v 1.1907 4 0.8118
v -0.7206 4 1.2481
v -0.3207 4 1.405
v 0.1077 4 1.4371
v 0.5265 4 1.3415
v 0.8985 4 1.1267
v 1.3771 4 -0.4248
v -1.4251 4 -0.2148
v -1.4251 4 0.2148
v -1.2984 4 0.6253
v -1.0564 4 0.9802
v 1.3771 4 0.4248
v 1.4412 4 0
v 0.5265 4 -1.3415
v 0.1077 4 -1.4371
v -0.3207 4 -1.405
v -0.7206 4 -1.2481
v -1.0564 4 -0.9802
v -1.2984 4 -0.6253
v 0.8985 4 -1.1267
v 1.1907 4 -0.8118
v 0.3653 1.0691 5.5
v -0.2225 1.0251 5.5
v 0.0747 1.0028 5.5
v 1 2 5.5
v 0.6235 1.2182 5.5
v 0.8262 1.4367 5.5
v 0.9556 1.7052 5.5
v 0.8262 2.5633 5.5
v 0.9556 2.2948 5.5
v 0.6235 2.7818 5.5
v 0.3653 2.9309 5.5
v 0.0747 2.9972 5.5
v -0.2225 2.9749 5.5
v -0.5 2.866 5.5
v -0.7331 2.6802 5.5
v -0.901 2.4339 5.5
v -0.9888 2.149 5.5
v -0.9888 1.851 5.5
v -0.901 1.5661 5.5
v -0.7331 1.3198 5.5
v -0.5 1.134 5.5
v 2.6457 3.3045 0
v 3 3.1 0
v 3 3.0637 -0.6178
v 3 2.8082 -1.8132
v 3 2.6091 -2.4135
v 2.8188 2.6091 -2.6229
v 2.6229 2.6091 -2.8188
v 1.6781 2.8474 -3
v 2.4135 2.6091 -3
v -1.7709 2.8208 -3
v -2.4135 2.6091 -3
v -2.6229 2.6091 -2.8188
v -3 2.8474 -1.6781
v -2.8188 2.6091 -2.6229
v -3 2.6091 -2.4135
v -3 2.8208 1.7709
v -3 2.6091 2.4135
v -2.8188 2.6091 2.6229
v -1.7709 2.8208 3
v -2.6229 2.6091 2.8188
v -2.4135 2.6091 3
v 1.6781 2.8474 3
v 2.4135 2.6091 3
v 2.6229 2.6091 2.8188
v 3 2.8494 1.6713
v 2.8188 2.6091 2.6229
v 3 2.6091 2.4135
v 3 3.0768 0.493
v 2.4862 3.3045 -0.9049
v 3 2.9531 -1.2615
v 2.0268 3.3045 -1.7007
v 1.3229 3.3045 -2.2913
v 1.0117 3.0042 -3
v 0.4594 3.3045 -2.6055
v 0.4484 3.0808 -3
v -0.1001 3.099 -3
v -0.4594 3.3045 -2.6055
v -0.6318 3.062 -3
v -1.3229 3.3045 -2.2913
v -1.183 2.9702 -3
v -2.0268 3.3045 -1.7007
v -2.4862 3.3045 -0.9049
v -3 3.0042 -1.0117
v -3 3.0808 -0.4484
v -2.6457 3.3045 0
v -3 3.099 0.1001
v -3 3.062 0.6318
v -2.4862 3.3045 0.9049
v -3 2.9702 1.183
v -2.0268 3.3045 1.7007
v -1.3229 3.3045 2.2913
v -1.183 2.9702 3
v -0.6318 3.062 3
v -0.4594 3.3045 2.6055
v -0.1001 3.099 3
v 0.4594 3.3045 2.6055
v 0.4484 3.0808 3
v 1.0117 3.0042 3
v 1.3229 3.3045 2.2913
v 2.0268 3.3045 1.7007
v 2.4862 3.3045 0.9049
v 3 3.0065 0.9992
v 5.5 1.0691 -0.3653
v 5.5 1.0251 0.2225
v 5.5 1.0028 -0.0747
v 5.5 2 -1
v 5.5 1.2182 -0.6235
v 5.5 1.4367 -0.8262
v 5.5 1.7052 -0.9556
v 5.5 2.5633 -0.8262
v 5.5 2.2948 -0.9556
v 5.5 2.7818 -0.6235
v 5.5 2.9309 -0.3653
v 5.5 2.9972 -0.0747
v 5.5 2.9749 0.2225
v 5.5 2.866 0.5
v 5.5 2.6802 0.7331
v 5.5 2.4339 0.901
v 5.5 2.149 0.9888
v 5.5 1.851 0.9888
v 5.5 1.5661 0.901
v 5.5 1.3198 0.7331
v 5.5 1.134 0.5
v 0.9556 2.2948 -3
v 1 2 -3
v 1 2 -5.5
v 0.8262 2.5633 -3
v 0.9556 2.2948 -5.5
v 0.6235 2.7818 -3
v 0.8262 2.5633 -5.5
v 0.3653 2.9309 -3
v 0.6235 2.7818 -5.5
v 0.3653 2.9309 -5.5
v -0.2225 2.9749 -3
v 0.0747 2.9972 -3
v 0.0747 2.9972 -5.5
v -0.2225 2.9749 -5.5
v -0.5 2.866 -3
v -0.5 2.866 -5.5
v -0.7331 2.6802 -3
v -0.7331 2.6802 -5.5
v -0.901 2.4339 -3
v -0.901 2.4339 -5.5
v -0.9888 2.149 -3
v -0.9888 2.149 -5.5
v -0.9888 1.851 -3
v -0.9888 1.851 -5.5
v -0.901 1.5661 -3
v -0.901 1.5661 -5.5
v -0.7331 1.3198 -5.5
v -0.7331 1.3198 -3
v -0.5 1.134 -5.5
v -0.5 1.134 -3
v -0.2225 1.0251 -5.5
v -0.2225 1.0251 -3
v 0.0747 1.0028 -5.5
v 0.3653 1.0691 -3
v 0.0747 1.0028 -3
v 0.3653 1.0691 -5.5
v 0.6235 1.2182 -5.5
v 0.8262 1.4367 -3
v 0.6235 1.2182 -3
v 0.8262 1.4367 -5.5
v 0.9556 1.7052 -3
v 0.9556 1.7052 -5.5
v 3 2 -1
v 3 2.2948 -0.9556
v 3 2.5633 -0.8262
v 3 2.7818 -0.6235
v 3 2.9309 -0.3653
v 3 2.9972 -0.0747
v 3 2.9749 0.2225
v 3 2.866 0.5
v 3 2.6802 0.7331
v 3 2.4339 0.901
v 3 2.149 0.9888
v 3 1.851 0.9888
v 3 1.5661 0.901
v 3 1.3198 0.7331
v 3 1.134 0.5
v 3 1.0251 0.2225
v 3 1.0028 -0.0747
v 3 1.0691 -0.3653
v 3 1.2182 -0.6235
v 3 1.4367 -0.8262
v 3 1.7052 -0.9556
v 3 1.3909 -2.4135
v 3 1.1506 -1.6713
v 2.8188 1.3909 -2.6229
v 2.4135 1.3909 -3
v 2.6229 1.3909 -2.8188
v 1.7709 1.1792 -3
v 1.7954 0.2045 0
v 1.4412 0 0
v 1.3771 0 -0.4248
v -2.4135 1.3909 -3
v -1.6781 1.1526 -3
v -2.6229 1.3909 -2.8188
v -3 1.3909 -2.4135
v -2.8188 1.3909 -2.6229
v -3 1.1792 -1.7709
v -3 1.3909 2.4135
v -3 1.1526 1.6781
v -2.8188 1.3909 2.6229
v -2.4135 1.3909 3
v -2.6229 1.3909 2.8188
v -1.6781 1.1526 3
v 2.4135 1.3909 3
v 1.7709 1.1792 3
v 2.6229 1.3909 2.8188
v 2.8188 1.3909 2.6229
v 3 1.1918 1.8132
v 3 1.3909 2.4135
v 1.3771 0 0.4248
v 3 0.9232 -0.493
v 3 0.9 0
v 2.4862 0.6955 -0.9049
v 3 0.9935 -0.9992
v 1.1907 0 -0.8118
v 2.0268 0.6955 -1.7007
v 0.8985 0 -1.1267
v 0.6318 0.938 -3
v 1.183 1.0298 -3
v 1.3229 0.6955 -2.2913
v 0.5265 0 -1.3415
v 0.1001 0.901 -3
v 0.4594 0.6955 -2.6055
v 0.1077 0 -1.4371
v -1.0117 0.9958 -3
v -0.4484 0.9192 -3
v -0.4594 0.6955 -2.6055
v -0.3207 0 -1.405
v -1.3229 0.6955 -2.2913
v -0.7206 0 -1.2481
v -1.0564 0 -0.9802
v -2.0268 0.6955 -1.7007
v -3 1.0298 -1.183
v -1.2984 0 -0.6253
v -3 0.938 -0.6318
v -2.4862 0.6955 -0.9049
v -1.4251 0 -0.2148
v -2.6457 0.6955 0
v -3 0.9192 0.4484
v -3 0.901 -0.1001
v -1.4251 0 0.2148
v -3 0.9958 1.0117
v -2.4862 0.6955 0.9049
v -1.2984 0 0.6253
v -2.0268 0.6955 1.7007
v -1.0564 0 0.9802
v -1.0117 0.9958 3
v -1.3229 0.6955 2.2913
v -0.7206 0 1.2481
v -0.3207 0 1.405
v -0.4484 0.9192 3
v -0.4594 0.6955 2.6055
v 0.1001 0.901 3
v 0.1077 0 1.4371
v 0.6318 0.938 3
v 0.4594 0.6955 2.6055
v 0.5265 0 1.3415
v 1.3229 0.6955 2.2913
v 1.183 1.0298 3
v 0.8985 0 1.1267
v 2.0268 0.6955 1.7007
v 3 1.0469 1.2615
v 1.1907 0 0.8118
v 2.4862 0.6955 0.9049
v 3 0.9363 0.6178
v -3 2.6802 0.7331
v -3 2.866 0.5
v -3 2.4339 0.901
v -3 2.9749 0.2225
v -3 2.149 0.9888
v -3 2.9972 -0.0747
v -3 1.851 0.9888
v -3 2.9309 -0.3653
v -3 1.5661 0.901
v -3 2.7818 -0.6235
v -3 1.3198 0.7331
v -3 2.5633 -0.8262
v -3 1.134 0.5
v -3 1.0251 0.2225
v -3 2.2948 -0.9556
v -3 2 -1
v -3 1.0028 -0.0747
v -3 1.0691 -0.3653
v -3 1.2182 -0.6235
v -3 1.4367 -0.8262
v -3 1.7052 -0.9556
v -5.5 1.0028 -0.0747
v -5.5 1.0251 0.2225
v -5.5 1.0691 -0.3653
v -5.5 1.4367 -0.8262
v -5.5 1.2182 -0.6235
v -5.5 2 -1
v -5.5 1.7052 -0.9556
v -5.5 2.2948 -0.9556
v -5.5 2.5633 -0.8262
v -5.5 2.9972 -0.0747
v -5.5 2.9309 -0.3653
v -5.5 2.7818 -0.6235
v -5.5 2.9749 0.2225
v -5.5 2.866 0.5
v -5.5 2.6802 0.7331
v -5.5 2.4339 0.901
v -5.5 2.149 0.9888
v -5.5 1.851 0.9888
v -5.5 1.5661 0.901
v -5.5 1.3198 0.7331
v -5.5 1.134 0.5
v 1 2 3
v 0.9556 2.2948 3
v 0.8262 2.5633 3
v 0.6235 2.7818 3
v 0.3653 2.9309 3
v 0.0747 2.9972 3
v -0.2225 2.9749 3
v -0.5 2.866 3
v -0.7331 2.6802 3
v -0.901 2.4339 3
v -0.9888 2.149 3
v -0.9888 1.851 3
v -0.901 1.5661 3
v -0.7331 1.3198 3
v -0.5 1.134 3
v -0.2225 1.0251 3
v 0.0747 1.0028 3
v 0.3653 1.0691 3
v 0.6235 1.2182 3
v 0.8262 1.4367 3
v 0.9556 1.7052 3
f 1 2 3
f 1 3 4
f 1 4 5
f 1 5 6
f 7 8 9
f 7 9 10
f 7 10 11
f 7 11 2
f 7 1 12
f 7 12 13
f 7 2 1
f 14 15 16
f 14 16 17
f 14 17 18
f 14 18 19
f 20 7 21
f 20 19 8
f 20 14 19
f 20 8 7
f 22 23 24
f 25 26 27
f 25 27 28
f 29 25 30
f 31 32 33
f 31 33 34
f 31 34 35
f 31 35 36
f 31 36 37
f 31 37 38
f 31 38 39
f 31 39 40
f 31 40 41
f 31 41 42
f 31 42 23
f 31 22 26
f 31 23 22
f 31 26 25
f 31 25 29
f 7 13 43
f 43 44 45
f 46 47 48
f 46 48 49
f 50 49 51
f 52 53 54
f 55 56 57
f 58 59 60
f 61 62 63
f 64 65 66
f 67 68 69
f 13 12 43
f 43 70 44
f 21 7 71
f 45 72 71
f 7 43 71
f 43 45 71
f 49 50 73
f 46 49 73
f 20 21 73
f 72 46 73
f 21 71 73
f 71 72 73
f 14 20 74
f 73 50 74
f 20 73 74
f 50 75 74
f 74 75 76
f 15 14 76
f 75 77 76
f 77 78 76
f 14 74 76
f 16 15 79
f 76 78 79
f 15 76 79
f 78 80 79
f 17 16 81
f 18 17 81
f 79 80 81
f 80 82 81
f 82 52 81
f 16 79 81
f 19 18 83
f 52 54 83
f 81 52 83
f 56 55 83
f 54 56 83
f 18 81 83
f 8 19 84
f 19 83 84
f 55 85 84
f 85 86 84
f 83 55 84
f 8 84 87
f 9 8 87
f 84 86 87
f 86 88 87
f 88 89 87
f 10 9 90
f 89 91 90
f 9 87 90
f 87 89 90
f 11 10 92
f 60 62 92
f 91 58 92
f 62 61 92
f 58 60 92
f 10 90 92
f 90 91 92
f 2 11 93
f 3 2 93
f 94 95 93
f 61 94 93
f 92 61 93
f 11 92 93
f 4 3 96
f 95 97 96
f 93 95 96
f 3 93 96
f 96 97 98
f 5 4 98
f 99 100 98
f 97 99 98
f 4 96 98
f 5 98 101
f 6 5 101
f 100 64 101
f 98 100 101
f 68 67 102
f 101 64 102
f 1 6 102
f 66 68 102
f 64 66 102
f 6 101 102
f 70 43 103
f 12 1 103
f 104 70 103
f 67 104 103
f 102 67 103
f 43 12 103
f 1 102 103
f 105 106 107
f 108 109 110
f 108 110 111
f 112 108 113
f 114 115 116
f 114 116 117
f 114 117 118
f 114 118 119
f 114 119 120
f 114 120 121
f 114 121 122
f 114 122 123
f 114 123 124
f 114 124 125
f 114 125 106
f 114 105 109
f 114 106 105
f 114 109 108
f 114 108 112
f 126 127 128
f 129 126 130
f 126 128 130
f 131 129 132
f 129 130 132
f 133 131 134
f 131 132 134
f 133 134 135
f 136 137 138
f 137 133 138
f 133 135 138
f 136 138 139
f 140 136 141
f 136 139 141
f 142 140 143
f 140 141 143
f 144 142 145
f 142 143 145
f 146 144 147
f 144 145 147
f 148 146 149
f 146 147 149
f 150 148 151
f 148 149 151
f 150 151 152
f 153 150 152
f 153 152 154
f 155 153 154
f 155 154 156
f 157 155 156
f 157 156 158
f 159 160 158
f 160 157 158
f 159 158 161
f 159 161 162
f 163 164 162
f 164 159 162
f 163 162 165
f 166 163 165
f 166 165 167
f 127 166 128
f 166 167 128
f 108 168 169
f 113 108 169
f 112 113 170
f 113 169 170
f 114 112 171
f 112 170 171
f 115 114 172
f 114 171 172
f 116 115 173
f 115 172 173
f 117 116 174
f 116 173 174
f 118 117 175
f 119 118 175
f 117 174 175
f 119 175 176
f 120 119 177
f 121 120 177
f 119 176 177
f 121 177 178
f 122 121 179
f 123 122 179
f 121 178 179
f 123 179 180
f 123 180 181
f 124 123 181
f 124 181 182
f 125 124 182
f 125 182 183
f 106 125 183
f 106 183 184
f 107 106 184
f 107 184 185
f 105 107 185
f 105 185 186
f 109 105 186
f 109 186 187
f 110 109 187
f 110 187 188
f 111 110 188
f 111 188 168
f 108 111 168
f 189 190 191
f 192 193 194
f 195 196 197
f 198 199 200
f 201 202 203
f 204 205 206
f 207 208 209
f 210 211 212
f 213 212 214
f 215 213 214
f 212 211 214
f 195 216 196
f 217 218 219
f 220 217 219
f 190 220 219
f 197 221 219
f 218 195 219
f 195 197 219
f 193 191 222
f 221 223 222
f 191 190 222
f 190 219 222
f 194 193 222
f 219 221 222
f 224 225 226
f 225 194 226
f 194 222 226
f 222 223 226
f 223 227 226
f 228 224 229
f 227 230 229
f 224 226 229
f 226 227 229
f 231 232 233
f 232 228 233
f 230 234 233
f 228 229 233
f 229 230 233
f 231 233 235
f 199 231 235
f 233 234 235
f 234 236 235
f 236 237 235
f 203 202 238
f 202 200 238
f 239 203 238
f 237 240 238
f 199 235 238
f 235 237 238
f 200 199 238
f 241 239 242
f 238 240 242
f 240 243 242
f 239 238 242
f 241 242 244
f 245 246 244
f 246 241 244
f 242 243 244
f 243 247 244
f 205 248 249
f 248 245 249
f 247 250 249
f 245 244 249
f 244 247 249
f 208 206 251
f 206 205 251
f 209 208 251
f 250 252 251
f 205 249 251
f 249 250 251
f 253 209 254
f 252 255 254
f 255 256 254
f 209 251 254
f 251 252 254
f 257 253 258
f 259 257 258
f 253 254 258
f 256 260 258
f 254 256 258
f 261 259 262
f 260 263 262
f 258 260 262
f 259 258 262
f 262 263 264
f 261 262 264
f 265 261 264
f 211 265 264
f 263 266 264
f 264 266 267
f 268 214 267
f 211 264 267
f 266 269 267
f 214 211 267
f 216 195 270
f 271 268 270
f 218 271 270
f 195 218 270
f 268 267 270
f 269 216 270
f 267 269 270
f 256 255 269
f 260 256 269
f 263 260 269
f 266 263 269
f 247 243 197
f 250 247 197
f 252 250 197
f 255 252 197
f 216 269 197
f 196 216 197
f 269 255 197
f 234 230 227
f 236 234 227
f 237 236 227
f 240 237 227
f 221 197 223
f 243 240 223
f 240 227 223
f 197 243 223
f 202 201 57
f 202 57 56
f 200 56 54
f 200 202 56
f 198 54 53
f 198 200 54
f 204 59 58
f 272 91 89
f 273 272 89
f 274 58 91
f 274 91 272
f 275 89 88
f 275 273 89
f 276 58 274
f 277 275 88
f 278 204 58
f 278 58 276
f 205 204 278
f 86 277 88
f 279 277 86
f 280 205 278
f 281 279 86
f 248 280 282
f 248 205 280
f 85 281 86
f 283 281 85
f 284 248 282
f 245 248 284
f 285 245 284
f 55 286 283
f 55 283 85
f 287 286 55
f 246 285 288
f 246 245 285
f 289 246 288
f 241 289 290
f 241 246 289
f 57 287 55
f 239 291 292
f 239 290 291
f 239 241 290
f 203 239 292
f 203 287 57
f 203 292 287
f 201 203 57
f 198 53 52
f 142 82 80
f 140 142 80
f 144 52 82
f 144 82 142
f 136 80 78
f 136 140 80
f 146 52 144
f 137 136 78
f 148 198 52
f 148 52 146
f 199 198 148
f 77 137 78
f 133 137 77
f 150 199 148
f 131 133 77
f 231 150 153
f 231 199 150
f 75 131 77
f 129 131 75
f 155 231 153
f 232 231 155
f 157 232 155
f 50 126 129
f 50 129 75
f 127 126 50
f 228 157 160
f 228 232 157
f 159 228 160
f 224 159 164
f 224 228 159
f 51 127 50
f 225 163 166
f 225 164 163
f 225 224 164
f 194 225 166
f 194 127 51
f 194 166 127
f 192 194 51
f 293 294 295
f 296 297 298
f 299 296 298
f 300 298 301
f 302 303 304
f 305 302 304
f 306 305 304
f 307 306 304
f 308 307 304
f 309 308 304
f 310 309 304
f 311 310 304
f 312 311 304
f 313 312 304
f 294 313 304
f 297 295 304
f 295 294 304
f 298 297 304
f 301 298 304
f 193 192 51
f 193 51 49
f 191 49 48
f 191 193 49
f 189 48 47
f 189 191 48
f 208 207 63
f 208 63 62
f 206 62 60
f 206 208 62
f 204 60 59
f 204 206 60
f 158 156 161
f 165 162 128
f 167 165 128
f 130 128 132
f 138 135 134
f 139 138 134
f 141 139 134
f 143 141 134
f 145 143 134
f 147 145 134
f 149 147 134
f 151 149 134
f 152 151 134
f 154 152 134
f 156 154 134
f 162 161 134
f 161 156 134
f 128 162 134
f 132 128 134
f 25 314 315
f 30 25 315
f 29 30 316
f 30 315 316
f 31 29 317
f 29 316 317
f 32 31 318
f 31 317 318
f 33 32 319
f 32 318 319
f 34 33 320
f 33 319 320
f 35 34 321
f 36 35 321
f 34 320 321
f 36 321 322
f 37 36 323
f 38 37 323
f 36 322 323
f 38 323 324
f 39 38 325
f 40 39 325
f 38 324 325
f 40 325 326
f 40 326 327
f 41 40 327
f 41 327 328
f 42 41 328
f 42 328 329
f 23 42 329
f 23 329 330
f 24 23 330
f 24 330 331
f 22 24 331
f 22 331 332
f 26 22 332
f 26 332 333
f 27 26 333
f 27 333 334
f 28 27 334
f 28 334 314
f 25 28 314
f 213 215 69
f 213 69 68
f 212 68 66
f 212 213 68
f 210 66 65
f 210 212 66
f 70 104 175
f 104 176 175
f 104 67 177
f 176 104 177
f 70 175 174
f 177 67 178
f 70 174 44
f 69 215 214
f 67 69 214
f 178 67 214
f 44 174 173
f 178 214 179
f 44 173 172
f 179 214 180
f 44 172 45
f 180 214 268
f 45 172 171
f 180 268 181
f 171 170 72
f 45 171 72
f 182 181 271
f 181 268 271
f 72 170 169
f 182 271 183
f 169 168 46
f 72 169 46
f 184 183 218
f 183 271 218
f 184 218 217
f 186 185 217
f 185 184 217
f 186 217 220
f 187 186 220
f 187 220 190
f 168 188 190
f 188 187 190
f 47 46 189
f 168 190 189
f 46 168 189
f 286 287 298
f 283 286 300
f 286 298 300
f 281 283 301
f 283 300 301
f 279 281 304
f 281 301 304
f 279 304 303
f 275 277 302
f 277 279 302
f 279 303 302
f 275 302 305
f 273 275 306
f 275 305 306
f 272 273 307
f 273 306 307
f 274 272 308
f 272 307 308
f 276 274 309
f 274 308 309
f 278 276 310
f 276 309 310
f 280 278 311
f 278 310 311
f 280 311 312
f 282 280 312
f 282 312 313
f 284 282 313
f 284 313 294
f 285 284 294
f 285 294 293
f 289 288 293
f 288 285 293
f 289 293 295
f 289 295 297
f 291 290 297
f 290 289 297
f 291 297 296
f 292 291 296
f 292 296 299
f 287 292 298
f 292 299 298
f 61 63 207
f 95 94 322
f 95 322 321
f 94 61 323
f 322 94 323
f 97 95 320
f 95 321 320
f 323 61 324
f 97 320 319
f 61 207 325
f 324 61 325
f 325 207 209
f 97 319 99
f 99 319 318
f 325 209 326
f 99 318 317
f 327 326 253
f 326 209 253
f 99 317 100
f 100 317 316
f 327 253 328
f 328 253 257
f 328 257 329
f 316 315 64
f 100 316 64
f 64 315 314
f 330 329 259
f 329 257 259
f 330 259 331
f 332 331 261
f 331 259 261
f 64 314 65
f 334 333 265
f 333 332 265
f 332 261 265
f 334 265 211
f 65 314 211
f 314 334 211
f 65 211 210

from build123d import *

# Parameters (mm, degrees)
SKETCH1_W                = 6
SKETCH1_H                = 6
BOSS_EXTRUDE1_DEPTH      = 4
CUT_REVOLVE_THIN1_DEPTH  = 4
BOSS_EXTRUDE2_DEPTH      = 5.5
BOSS_EXTRUDE2_DEPTH_BACK = 5.5
SKETCH3_R                = 1
BOSS_EXTRUDE3_DEPTH      = 5.5
BOSS_EXTRUDE3_DEPTH_BACK = 5.5
SKETCH4_R                = 1


with BuildPart() as part:
    # Sketch1 → Boss-Extrude1 (new body)
    with BuildSketch(Plane(origin=(0, 0, 0), x_dir=(1, 0, 0), z_dir=(0, 1, 0))):
        Rectangle(SKETCH1_W, SKETCH1_H)
    extrude(amount=BOSS_EXTRUDE1_DEPTH)

    # Cut-Revolve-Thin1: read off the stored shape, not the designer's step
    # Cut-Revolve-Thin1 outline → Cut-Revolve-Thin1 (cut)
    with BuildSketch(Plane(origin=(0, 0, 0), x_dir=(1, 0, 0), z_dir=(0, 1, 0))):
        with BuildLine():
            ThreePointArc((3, -2.413514817), (2.722595616, -2.722595616), (2.413514817, -3))
            Line((2.413514817, -3), (3, -3))
            Line((3, -3), (3, -2.413514817))
        make_face()
        with BuildLine():
            Line((-3, -3), (-2.413514817, -3))
            ThreePointArc((-2.413514817, -3), (-2.722595616, -2.722595616), (-3, -2.413514817))
            Line((-3, -2.413514817), (-3, -3))
        make_face()
        with BuildLine():
            ThreePointArc((2.413514817, 3), (2.722595616, 2.722595616), (3, 2.413514817))
            Line((3, 2.413514817), (3, 3))
            Line((3, 3), (2.413514817, 3))
        make_face()
        with BuildLine():
            Line((-3, 3), (-3, 2.413514817))
            ThreePointArc((-3, 2.413514817), (-2.722595616, 2.722595616), (-2.413514817, 3))
            Line((-2.413514817, 3), (-3, 3))
        make_face()
    extrude(amount=CUT_REVOLVE_THIN1_DEPTH, mode=Mode.SUBTRACT)

    # Cut-Revolve-Thin1 2 outline → Cut-Revolve-Thin1 2 (revolve, cut)
    with BuildSketch(Plane.XY):
        Polygon((3.850331645, 4), (1.441154273, 4), (3.850331645, 2.609060796), align=None)
        Polygon((3.850331645, 0), (3.850331645, 1.390939204), (1.441154273, 0), align=None)
    revolve(axis=Axis((0, 0, 0), (0, 1, 0)), mode=Mode.SUBTRACT)

    # Sketch3 → Boss-Extrude2 (add, two sides: drawn at the far end of the back side and taken through both)
    with BuildSketch(Plane.XY.offset(-BOSS_EXTRUDE2_DEPTH_BACK)):
        with Locations((0, 2)):
            Circle(SKETCH3_R)
    extrude(amount=BOSS_EXTRUDE2_DEPTH + BOSS_EXTRUDE2_DEPTH_BACK)

    # Sketch4 → Boss-Extrude3 (add, two sides: drawn at the far end of the back side and taken through both)
    with BuildSketch(Plane(origin=(0, 0, 0), x_dir=(0, 0, -1), z_dir=(1, 0, 0)).offset(-BOSS_EXTRUDE3_DEPTH_BACK)):
        with Locations((0, 2)):
            Circle(SKETCH4_R)
    extrude(amount=BOSS_EXTRUDE3_DEPTH + BOSS_EXTRUDE3_DEPTH_BACK)


solid = part.part
